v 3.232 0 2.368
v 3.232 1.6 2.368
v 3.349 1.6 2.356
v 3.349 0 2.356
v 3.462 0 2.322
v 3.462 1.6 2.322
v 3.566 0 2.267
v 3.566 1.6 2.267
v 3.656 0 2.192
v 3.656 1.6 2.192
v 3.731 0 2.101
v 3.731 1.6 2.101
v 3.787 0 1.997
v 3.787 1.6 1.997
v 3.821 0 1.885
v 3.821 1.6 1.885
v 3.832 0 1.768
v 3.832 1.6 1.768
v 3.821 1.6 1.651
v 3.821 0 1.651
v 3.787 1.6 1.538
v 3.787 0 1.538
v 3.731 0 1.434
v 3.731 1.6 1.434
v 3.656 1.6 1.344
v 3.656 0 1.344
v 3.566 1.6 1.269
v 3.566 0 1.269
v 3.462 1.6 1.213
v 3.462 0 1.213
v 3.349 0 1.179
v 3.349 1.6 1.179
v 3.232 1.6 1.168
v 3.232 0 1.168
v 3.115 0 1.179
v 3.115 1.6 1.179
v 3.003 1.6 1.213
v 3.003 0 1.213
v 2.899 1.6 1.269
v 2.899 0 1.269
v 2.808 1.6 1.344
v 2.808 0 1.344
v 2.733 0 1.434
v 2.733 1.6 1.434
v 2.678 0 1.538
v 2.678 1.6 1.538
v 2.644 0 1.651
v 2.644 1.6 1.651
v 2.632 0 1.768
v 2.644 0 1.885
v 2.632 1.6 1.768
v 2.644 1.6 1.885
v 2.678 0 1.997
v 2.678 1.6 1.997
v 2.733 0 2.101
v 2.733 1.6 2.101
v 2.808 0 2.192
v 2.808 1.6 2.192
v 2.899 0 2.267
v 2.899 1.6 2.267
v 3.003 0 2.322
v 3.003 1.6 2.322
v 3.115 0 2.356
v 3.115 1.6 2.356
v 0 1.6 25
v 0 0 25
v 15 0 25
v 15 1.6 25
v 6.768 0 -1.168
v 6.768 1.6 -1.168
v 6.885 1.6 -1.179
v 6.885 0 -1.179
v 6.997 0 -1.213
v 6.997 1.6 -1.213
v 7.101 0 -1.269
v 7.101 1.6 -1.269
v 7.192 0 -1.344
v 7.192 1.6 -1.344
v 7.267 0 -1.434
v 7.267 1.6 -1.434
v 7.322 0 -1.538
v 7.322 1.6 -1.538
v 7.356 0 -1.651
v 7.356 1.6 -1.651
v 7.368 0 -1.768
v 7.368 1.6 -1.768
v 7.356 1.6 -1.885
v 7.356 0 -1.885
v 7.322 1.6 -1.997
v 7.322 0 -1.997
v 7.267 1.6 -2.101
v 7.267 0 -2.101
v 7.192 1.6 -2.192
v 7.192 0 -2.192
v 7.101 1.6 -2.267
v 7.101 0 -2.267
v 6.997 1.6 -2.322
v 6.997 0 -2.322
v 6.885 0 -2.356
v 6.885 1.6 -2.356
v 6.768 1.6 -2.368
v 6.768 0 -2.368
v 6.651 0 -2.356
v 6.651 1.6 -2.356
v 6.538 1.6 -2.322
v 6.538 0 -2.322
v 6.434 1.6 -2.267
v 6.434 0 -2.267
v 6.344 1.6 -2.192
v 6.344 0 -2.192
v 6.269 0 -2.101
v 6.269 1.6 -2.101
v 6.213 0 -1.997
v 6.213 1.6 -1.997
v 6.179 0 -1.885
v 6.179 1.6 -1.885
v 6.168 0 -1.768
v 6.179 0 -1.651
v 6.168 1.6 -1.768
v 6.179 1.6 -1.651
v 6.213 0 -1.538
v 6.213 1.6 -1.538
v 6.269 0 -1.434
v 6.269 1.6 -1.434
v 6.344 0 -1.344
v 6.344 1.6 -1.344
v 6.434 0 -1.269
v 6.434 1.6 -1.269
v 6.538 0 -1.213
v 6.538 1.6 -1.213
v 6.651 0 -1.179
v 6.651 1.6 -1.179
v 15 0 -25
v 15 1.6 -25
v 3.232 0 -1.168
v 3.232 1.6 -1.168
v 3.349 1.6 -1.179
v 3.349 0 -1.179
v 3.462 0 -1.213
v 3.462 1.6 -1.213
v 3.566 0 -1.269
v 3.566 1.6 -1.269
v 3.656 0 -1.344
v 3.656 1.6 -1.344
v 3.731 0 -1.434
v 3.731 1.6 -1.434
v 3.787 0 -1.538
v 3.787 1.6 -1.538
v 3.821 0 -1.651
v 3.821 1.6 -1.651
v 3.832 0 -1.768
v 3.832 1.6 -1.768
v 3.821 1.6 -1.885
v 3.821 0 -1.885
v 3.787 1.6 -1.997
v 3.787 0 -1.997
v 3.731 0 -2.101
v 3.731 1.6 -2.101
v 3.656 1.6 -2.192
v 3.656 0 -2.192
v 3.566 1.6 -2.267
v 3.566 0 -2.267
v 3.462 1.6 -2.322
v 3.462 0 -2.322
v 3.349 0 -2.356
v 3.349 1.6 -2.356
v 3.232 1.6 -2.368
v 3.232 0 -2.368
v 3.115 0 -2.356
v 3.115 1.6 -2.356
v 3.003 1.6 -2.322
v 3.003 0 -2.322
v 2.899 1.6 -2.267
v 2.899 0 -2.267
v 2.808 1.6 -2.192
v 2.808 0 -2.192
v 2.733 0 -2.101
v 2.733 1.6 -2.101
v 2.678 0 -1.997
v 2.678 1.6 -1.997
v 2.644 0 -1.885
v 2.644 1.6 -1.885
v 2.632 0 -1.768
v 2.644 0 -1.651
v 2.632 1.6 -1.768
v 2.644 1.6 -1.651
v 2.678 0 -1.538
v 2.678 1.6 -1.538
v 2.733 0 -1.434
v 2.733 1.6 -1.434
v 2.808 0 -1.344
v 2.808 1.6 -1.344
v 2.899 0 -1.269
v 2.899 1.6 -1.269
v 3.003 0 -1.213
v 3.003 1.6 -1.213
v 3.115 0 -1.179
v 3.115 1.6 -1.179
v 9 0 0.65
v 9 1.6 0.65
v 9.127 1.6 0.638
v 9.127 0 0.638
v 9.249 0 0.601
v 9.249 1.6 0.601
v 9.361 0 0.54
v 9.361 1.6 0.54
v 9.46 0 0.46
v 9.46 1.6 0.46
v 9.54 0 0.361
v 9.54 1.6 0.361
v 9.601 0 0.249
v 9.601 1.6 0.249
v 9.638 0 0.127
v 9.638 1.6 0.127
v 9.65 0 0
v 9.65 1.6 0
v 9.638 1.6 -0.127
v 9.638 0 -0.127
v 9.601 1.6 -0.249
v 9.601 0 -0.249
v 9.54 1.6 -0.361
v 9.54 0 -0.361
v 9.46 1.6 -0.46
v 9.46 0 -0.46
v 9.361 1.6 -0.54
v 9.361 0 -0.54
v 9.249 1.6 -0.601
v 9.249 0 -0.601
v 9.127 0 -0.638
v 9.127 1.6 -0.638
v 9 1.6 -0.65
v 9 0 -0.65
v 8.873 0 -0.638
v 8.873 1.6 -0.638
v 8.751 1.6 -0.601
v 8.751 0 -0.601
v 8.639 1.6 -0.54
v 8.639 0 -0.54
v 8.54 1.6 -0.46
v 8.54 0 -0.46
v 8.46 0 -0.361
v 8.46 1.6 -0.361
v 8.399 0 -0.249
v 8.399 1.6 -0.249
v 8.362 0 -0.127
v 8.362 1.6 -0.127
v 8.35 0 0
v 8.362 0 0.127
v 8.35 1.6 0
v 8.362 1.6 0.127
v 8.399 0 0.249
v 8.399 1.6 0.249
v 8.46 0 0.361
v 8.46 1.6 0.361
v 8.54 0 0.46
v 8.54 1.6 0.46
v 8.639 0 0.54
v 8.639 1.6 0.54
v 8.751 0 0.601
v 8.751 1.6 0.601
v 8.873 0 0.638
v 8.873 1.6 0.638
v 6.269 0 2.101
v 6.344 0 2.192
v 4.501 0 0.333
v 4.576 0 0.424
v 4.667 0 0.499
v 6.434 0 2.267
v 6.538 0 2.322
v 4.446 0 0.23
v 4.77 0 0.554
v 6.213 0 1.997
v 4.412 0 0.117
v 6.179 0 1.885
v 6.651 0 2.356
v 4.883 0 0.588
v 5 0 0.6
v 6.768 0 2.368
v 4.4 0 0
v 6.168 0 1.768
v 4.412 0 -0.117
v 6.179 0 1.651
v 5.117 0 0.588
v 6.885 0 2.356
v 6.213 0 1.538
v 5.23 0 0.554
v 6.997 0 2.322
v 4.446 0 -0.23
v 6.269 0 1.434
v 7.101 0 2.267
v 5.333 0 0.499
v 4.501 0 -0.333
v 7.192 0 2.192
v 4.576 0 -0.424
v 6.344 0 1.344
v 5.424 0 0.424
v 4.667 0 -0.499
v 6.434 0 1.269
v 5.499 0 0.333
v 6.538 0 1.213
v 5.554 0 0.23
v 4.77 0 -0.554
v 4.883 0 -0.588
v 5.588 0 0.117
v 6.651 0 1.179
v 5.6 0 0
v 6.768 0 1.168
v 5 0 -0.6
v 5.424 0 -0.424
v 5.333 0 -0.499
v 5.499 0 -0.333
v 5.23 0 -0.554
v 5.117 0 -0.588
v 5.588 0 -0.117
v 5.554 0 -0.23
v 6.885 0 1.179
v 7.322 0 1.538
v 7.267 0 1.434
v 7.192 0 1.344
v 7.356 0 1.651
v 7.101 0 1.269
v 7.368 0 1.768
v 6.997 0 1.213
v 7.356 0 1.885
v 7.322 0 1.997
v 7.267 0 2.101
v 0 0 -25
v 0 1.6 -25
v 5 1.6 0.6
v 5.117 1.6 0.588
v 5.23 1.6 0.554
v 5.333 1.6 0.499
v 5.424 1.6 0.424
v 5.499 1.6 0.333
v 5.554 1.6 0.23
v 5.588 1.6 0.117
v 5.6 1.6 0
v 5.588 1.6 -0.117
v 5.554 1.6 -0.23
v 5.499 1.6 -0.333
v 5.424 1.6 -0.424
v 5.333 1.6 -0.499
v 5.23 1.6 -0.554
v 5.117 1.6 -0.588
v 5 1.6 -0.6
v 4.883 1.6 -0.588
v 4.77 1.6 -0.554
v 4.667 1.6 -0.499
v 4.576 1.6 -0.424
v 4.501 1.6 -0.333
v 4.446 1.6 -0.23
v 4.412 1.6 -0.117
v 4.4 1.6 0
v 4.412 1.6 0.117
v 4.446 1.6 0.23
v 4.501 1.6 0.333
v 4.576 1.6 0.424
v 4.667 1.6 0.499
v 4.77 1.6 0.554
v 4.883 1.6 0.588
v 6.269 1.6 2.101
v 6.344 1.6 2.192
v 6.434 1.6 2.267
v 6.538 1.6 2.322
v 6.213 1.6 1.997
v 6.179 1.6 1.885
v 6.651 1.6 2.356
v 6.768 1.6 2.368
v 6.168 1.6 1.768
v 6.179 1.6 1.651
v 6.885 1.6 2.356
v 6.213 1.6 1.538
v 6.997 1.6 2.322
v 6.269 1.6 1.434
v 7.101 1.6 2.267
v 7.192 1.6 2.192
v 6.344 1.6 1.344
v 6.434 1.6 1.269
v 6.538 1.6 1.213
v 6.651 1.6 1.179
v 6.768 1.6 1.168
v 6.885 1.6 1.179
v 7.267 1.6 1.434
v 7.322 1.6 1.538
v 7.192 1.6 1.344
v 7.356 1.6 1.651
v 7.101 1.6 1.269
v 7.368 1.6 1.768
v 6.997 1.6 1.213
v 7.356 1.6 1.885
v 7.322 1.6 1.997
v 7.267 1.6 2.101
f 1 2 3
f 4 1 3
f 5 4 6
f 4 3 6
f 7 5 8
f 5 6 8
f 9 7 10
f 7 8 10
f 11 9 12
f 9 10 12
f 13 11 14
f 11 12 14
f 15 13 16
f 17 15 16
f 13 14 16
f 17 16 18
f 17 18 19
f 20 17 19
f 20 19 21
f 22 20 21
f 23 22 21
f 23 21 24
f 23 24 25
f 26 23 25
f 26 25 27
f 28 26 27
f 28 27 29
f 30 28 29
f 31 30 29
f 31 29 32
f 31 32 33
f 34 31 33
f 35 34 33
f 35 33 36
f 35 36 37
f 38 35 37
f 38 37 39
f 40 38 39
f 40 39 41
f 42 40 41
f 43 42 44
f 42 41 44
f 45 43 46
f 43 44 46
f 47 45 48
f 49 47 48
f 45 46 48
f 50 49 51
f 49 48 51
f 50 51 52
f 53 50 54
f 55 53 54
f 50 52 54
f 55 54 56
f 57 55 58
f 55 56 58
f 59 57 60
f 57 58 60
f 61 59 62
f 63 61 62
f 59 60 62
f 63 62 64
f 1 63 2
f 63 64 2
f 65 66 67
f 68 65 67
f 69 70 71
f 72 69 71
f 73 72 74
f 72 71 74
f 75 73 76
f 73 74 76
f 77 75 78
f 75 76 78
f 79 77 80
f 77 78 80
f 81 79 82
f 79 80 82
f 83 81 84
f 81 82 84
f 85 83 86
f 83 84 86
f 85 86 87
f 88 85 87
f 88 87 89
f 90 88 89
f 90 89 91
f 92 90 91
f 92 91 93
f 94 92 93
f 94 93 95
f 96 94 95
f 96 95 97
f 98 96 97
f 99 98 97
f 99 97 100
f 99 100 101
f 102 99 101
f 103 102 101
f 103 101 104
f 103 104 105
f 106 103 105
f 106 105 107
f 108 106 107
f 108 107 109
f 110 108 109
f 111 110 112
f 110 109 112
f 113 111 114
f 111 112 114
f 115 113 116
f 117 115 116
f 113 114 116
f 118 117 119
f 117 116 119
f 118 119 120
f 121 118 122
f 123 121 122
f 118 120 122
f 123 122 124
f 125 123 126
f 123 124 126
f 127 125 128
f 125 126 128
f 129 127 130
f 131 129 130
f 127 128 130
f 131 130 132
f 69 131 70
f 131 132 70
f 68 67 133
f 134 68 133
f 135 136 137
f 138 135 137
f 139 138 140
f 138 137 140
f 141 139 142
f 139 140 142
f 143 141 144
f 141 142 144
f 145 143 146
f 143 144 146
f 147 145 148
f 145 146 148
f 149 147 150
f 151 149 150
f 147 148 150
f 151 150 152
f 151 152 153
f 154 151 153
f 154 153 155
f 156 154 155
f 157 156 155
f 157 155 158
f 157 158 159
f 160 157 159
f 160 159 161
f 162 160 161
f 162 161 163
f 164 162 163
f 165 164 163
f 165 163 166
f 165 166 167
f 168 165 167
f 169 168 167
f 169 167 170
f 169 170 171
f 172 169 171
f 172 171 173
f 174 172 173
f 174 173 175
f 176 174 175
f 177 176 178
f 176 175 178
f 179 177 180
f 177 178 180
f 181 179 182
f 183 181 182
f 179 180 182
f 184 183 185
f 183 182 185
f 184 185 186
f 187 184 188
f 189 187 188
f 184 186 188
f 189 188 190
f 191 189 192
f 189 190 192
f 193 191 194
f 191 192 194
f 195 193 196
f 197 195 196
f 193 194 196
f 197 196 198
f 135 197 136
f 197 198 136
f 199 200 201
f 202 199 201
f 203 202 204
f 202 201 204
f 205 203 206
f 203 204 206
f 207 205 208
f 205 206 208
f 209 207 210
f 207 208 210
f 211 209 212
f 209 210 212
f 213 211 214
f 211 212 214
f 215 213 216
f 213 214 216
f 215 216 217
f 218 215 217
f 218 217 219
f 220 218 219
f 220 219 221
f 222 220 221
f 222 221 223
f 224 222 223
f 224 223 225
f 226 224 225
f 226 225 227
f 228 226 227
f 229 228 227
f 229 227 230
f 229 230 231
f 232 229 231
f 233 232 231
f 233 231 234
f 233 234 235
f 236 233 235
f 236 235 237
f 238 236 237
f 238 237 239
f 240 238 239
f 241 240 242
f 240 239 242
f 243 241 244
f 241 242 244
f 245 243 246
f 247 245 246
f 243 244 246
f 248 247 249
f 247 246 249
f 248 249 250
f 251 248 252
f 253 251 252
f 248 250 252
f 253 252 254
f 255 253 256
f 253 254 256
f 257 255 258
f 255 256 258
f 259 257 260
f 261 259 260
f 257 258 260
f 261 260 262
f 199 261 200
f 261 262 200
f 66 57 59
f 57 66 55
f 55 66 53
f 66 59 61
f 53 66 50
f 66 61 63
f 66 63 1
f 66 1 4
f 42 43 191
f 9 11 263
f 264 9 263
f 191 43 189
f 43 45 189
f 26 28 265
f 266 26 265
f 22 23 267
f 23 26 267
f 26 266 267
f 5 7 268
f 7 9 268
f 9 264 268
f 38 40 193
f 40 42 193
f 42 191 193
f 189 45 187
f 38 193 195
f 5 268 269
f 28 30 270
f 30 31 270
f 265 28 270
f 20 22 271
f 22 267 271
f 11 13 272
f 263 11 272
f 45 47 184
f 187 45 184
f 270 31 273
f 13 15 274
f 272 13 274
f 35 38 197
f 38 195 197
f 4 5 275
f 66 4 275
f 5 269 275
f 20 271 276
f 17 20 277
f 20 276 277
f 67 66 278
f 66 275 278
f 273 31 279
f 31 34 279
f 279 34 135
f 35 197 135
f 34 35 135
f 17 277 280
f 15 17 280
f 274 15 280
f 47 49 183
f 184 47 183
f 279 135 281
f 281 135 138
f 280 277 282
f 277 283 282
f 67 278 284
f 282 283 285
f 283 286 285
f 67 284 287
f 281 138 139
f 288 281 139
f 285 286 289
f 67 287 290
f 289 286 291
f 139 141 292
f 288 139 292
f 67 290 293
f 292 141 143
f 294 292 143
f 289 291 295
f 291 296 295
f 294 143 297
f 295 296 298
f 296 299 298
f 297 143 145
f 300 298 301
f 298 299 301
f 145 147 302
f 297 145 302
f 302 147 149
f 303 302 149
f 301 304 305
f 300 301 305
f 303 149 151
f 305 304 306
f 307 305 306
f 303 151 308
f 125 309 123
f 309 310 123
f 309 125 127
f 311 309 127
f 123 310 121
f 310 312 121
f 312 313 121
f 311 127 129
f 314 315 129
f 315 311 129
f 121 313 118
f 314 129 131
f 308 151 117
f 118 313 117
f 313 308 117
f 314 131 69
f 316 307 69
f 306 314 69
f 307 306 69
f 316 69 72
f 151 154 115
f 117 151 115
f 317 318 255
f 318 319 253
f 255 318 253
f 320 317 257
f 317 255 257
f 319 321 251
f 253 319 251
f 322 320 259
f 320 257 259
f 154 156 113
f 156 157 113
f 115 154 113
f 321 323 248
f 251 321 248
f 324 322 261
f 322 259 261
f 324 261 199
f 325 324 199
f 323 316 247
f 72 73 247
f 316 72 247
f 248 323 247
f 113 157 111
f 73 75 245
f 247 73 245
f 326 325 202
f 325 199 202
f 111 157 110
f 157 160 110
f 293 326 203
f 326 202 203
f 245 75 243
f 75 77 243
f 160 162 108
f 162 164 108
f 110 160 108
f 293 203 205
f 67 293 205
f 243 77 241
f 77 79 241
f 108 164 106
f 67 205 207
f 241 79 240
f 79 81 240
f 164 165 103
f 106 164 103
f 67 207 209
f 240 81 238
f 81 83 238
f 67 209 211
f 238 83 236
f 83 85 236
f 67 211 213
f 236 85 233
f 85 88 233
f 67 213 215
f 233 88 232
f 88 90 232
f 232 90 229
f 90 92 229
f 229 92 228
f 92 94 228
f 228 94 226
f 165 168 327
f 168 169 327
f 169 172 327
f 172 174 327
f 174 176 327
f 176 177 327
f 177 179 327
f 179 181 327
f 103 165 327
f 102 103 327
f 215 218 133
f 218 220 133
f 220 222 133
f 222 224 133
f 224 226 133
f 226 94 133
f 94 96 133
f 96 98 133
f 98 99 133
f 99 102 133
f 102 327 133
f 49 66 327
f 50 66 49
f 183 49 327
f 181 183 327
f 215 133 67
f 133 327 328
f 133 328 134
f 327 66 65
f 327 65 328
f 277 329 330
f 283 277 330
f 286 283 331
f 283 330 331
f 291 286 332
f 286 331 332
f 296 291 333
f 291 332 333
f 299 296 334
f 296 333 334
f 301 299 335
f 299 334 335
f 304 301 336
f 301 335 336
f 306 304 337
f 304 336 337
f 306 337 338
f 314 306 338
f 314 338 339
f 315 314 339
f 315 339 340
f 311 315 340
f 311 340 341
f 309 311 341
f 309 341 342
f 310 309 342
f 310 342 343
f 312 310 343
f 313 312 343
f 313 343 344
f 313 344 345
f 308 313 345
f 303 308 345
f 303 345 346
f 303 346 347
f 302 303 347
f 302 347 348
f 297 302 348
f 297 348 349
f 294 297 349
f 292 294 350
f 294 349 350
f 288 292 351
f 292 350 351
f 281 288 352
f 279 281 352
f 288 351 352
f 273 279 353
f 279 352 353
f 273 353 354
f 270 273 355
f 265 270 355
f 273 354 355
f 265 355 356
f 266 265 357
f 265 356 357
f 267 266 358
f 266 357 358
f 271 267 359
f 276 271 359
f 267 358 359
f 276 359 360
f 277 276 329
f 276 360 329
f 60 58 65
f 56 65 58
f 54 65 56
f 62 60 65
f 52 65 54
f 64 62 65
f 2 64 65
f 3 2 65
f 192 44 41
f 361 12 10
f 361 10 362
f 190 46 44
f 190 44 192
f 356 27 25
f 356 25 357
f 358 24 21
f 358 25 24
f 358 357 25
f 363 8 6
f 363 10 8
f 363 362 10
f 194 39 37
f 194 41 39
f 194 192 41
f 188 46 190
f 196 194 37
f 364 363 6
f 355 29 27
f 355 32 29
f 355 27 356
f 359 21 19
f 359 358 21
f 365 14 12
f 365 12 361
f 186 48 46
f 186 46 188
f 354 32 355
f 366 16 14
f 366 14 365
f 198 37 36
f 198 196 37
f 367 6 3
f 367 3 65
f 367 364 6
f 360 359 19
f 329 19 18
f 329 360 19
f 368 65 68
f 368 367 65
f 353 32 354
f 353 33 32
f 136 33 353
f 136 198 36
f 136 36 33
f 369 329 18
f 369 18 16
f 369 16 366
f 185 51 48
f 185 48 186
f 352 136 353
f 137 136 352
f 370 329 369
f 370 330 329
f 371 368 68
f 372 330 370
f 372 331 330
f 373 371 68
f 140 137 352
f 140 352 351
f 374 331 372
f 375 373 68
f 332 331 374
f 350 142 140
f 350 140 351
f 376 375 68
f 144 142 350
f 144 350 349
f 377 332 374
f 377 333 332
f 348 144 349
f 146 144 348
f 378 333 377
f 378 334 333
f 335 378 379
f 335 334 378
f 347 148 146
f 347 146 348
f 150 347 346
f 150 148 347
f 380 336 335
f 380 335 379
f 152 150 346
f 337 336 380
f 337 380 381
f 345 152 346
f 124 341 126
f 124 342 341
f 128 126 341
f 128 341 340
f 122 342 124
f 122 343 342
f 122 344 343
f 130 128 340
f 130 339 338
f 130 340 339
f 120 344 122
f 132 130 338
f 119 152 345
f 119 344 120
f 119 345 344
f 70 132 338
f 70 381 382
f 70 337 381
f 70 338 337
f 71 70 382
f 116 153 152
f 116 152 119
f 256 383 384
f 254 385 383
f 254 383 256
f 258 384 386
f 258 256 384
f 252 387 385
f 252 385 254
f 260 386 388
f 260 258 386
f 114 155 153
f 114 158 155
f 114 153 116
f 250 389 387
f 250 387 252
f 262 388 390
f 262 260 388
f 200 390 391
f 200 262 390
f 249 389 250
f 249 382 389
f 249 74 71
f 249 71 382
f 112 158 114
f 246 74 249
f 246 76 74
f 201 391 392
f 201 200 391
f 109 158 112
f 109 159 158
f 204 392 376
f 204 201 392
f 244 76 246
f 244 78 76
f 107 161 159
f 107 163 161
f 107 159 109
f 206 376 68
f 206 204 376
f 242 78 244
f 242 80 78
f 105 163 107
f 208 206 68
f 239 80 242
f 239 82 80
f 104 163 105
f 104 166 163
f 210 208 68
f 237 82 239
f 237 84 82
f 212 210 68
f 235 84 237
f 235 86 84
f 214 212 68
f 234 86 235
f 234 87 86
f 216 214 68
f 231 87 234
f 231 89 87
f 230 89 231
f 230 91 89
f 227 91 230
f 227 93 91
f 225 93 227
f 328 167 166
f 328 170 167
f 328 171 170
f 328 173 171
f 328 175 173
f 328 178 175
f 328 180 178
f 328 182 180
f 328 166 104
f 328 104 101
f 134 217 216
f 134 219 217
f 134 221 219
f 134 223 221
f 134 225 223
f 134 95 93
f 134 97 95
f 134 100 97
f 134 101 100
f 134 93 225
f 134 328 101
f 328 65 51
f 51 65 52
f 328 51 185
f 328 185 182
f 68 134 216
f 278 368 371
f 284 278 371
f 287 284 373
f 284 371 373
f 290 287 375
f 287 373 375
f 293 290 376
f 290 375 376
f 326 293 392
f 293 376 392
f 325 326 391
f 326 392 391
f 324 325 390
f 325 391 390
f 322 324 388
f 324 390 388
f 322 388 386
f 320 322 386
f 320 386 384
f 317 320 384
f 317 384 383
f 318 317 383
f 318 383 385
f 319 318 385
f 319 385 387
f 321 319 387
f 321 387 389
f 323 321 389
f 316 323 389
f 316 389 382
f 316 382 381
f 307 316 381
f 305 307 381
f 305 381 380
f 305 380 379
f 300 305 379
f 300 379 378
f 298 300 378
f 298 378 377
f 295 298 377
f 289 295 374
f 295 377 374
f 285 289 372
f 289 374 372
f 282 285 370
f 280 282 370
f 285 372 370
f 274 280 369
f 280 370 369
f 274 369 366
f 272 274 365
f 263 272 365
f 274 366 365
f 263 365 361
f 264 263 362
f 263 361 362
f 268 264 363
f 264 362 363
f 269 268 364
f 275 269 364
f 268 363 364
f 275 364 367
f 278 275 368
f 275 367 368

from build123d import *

# Parameters (mm, degrees)
SKETCH1_W                = 15
SKETCH1_H                = 50
BOSS_EXTRUDE1_DEPTH      = 1.6
M12_MOUNTING_HOLES_REACH = 31.199
SKETCH3_R                = 0.6
SKETCH3_R_2              = 0.65


with BuildPart() as part:
    # Sketch1 → Boss-Extrude1 (new body)
    with BuildSketch(Plane(origin=(0, 0, 0), x_dir=(1, 0, 0), z_dir=(0, 1, 0))):
        with Locations((7.5, 0)):
            Rectangle(SKETCH1_W, SKETCH1_H)
    extrude(amount=BOSS_EXTRUDE1_DEPTH)

    # Sketch3 → M12 mounting holes (cut, up to next)
    with BuildSketch(Plane(origin=(0, 1.6, 0), x_dir=(1, 0, 0), z_dir=(0, 1, 0)), mode=Mode.PRIVATE) as m12_mounting_holes_sk1:
        with Locations(Location((5, 0, 0), (0, 0, 270))):
            Circle(SKETCH3_R)
    m12_mounting_holes_tool1 = extrude(m12_mounting_holes_sk1.sketch, amount=-M12_MOUNTING_HOLES_REACH, mode=Mode.PRIVATE) & part.part
    # Sketch3 → M12 mounting holes (cut, up to next)
    with BuildSketch(Plane(origin=(0, 1.6, 0), x_dir=(1, 0, 0), z_dir=(0, 1, 0)), mode=Mode.PRIVATE) as m12_mounting_holes_sk2:
        with Locations(Location((3.232233047, 1.767766953, 0), (0, 0, 270))):
            Circle(SKETCH3_R)
    m12_mounting_holes_tool2 = extrude(m12_mounting_holes_sk2.sketch, amount=-M12_MOUNTING_HOLES_REACH, mode=Mode.PRIVATE) & part.part
    # Sketch3 → M12 mounting holes (cut, up to next)
    with BuildSketch(Plane(origin=(0, 1.6, 0), x_dir=(1, 0, 0), z_dir=(0, 1, 0)), mode=Mode.PRIVATE) as m12_mounting_holes_sk3:
        with Locations(Location((6.767766953, 1.767766953, 0), (0, 0, 270))):
            Circle(SKETCH3_R)
    m12_mounting_holes_tool3 = extrude(m12_mounting_holes_sk3.sketch, amount=-M12_MOUNTING_HOLES_REACH, mode=Mode.PRIVATE) & part.part
    # Sketch3 → M12 mounting holes (cut, up to next)
    with BuildSketch(Plane(origin=(0, 1.6, 0), x_dir=(1, 0, 0), z_dir=(0, 1, 0)), mode=Mode.PRIVATE) as m12_mounting_holes_sk4:
        with Locations(Location((6.767766953, -1.767766953, 0), (0, 0, 270))):
            Circle(SKETCH3_R)
    m12_mounting_holes_tool4 = extrude(m12_mounting_holes_sk4.sketch, amount=-M12_MOUNTING_HOLES_REACH, mode=Mode.PRIVATE) & part.part
    # Sketch3 → M12 mounting holes (cut, up to next)
    with BuildSketch(Plane(origin=(0, 1.6, 0), x_dir=(1, 0, 0), z_dir=(0, 1, 0)), mode=Mode.PRIVATE) as m12_mounting_holes_sk5:
        with Locations(Location((3.232233047, -1.767766953, 0), (0, 0, 270))):
            Circle(SKETCH3_R)
    m12_mounting_holes_tool5 = extrude(m12_mounting_holes_sk5.sketch, amount=-M12_MOUNTING_HOLES_REACH, mode=Mode.PRIVATE) & part.part
    # Sketch3 → M12 mounting holes (cut, up to next)
    with BuildSketch(Plane(origin=(0, 1.6, 0), x_dir=(1, 0, 0), z_dir=(0, 1, 0)), mode=Mode.PRIVATE) as m12_mounting_holes_sk6:
        with Locations(Location((9, 0, 0), (0, 0, 270))):
            Circle(SKETCH3_R_2)
    m12_mounting_holes_tool6 = extrude(m12_mounting_holes_sk6.sketch, amount=-M12_MOUNTING_HOLES_REACH, mode=Mode.PRIVATE) & part.part
    add(m12_mounting_holes_tool1.solids().sort_by_distance((5, 1.6, 0))[0], mode=Mode.SUBTRACT)
    add(m12_mounting_holes_tool2.solids().sort_by_distance((3.232233, 1.6, -1.767767))[0], mode=Mode.SUBTRACT)
    add(m12_mounting_holes_tool3.solids().sort_by_distance((6.767767, 1.6, -1.767767))[0], mode=Mode.SUBTRACT)
    add(m12_mounting_holes_tool4.solids().sort_by_distance((6.767767, 1.6, 1.767767))[0], mode=Mode.SUBTRACT)
    add(m12_mounting_holes_tool5.solids().sort_by_distance((3.232233, 1.6, 1.767767))[0], mode=Mode.SUBTRACT)
    add(m12_mounting_holes_tool6.solids().sort_by_distance((9, 1.6, 0))[0], mode=Mode.SUBTRACT)


solid = part.part
